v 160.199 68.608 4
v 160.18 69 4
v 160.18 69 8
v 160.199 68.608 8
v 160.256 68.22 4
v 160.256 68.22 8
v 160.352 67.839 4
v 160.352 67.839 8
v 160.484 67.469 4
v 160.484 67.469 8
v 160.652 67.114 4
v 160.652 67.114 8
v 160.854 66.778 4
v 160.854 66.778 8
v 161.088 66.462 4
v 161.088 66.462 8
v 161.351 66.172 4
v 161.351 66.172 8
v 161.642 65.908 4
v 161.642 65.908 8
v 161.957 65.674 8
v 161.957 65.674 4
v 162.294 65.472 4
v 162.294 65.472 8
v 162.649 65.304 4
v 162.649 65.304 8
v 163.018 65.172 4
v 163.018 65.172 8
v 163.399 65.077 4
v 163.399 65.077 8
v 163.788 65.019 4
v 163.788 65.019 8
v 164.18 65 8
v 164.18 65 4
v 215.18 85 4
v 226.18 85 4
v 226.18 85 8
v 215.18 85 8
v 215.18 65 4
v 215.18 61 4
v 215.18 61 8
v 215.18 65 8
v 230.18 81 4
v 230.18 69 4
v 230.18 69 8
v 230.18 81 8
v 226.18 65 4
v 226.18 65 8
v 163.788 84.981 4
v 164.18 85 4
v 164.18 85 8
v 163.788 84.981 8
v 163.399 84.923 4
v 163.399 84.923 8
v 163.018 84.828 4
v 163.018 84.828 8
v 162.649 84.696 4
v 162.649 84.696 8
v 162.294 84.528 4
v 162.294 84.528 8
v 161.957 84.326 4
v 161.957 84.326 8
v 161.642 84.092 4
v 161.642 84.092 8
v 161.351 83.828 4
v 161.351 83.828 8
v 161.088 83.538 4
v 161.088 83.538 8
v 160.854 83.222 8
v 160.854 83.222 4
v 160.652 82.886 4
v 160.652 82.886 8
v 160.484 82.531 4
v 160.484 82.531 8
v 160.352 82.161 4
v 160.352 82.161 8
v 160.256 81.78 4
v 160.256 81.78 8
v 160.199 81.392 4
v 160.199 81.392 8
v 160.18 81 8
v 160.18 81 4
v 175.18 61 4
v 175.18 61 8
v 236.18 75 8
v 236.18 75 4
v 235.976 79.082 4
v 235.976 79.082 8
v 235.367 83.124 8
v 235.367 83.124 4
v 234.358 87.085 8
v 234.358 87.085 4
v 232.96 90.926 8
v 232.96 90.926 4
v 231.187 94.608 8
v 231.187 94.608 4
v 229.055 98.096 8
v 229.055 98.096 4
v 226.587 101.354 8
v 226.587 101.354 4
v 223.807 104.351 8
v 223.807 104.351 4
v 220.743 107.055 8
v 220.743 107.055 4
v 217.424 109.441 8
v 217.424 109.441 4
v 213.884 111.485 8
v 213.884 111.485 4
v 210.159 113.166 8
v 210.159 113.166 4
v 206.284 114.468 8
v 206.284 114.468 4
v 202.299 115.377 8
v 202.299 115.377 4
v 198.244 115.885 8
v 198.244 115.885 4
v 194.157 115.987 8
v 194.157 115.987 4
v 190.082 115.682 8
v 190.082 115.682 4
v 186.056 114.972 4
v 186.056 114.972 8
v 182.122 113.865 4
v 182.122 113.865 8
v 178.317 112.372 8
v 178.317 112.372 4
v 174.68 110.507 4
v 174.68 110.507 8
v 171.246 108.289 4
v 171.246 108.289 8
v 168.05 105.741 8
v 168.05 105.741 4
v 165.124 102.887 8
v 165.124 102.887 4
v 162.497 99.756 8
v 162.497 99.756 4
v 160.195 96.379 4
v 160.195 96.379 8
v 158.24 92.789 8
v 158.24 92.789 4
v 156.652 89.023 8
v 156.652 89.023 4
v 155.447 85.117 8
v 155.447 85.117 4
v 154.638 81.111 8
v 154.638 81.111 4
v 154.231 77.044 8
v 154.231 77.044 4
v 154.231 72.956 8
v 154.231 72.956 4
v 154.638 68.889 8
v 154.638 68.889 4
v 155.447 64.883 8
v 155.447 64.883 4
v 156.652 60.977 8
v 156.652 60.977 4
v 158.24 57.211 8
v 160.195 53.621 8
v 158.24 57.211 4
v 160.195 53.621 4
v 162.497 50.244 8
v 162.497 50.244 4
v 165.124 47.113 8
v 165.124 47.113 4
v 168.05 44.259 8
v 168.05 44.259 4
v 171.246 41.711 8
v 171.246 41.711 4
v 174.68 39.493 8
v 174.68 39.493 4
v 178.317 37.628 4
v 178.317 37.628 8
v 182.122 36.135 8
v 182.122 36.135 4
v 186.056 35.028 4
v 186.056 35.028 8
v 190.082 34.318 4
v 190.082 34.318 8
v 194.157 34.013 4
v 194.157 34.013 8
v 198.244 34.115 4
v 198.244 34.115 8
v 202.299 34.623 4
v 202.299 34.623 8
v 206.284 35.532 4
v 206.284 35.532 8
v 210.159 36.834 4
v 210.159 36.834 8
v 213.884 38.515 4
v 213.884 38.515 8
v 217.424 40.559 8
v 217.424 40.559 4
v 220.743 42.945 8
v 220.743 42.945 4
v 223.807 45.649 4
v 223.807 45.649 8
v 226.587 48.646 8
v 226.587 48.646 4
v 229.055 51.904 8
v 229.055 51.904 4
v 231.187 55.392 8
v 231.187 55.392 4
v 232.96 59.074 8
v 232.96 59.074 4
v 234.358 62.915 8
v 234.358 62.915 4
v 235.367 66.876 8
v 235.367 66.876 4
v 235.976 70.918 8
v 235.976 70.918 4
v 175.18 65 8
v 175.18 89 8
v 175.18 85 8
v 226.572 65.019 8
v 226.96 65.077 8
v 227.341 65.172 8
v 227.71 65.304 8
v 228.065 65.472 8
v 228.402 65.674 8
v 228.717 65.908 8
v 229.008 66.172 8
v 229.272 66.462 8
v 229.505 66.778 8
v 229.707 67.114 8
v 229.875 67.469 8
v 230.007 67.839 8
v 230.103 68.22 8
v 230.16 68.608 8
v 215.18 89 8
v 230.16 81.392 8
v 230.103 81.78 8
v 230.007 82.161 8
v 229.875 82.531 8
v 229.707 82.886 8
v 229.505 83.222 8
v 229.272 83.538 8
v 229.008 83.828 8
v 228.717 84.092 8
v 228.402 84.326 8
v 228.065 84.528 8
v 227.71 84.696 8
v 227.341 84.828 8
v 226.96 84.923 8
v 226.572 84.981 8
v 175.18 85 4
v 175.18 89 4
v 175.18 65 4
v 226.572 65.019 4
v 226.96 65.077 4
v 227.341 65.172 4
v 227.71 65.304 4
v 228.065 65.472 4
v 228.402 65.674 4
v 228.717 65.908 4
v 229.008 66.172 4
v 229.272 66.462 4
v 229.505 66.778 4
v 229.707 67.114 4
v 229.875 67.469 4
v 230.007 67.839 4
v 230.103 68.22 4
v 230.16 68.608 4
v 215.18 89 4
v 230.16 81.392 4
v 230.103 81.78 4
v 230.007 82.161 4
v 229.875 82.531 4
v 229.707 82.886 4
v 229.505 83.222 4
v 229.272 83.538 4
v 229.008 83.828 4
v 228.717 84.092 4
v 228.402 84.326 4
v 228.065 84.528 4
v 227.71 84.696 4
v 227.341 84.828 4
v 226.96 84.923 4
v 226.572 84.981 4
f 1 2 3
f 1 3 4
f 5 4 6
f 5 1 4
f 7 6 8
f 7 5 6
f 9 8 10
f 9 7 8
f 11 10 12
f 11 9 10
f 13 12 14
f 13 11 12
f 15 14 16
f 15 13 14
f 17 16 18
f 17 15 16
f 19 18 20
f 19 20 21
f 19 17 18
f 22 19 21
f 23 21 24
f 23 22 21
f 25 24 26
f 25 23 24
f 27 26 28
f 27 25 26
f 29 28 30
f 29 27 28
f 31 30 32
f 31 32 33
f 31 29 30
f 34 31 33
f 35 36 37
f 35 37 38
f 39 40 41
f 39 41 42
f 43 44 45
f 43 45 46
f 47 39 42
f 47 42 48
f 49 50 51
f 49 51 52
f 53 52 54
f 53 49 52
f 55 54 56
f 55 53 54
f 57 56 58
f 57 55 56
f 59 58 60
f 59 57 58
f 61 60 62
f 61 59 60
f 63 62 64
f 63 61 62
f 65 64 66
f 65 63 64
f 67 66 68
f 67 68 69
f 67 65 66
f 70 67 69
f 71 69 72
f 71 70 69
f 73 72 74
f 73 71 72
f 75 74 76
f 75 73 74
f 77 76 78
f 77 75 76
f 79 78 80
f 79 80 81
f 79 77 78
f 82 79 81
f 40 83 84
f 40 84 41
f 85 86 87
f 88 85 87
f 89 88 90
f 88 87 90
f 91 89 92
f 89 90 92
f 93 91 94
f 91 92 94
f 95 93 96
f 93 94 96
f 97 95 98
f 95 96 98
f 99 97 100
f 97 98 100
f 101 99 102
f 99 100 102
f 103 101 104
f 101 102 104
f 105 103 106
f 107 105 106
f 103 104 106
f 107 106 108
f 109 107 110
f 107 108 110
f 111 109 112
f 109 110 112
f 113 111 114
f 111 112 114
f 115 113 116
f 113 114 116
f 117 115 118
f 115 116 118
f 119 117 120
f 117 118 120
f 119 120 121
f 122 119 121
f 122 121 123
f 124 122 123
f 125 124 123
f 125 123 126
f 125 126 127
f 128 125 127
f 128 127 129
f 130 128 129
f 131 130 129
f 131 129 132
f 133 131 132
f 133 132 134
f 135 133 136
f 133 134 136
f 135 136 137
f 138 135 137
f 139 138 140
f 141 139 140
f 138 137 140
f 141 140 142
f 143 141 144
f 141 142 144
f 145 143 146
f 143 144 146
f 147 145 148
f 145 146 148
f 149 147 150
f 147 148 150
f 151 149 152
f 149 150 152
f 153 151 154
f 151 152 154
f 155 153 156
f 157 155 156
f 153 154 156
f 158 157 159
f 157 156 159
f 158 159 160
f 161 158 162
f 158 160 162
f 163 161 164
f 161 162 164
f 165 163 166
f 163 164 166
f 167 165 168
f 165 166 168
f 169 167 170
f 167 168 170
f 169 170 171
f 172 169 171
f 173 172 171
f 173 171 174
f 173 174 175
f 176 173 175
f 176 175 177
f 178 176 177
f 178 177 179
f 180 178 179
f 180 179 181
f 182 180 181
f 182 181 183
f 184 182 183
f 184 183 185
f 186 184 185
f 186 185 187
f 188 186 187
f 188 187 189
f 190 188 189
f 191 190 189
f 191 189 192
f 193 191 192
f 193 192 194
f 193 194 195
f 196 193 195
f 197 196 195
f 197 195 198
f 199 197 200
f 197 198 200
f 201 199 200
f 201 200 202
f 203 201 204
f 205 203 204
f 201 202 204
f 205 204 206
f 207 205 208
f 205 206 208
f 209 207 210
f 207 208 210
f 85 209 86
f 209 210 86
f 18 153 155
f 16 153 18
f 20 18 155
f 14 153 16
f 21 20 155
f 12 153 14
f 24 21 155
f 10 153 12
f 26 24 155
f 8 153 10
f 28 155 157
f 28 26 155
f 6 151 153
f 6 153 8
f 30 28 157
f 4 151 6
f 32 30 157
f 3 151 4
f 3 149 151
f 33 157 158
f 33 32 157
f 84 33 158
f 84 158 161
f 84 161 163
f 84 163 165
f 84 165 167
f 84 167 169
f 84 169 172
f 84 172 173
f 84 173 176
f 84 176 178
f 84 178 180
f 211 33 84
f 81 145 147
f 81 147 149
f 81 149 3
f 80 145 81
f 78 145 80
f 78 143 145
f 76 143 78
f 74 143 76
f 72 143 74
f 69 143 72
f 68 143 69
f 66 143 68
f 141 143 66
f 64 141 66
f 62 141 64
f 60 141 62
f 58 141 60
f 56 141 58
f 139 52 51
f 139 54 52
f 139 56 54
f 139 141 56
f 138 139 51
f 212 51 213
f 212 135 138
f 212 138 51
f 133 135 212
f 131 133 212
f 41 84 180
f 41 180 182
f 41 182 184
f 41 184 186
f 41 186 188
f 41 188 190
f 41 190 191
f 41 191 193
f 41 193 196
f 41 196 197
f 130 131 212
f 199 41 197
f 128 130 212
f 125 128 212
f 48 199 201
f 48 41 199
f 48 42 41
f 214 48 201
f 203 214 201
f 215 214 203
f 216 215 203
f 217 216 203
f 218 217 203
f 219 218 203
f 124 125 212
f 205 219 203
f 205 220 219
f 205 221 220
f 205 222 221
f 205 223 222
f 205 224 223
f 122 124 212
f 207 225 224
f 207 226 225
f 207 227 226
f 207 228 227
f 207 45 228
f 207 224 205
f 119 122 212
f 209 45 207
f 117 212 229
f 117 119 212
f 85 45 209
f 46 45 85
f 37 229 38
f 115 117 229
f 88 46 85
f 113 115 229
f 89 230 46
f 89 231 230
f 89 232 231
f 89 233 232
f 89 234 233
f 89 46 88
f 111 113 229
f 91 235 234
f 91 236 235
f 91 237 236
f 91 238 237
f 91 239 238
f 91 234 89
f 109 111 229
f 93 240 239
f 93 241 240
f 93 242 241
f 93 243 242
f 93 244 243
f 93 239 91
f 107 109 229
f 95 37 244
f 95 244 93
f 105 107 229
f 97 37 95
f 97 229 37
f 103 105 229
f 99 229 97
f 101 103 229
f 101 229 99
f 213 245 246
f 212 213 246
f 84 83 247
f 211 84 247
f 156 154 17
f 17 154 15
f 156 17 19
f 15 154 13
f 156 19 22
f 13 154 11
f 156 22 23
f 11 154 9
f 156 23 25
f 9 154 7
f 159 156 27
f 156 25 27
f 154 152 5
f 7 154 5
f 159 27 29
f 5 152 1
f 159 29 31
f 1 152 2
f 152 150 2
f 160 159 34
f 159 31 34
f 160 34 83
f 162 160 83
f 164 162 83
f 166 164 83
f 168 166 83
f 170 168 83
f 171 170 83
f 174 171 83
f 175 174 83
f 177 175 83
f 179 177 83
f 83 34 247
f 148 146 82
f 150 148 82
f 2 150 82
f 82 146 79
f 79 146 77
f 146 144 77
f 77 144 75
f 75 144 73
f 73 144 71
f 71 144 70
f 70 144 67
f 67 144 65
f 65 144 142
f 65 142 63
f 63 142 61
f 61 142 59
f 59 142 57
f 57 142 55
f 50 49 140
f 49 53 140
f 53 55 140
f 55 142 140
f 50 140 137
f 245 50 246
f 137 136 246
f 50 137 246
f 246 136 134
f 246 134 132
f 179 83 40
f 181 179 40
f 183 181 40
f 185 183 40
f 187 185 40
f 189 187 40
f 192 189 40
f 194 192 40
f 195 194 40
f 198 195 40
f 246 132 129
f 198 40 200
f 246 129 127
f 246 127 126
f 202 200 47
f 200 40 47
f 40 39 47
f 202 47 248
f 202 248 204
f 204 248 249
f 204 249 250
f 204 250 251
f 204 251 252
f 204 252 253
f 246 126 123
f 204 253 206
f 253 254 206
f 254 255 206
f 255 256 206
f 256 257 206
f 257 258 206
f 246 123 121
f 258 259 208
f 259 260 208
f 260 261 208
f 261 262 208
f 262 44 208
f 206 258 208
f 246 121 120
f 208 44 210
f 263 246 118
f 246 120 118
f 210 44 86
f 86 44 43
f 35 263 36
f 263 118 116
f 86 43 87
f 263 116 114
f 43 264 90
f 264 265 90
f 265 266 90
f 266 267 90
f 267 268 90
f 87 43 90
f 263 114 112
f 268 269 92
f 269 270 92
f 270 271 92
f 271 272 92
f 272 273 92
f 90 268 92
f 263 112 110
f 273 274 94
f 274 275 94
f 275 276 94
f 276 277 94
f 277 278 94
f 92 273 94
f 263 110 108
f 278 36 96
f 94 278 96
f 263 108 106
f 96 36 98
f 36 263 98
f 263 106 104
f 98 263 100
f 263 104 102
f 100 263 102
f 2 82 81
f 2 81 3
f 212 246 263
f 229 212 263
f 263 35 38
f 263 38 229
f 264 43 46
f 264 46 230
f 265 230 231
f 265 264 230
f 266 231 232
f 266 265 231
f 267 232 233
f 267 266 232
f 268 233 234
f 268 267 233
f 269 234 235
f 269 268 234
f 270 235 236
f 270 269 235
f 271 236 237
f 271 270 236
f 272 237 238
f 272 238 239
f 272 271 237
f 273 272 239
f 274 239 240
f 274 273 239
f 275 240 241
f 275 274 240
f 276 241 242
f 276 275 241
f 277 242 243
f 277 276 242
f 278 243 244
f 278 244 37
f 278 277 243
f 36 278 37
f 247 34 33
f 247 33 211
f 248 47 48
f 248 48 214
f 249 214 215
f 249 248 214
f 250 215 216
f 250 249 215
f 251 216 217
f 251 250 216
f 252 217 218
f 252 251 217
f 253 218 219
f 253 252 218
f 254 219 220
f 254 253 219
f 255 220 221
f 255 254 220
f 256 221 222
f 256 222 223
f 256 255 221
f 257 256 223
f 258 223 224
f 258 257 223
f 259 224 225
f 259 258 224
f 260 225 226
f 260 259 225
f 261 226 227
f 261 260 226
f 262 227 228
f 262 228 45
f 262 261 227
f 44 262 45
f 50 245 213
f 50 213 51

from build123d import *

# Parameters (mm, degrees)
SKETCH_R        = 41
PAD_DEPTH       = 4
SKETCH004_W     = 40
SKETCH004_H     = 4
POCKET002_DEPTH = 8.001


with BuildPart() as part:
    # Sketch → Pad (new body)
    with BuildSketch(Plane.XY.offset(4)):
        with Locations((195.179598, 75)):
            Circle(SKETCH_R)
        with BuildLine():
            Line((195.179598, 65), (226.179598, 65))
            ThreePointArc((226.179598, 65), (229.008025, 66.171573), (230.179598, 69))
            Line((230.179598, 69), (230.179598, 81))
            ThreePointArc((230.179598, 81), (229.008025, 83.828427), (226.179598, 85))
            Line((226.179598, 85), (195.179598, 85))
            Line((195.179598, 85), (164.179598, 85))
            ThreePointArc((164.179598, 85), (161.351171, 83.828427), (160.179598, 81))
            Line((160.179598, 81), (160.179598, 69))
            ThreePointArc((160.179598, 69), (161.351171, 66.171573), (164.179598, 65))
            Line((164.179598, 65), (195.179598, 65))
        make_face(mode=Mode.SUBTRACT)
    extrude(amount=PAD_DEPTH)

    # Sketch004 → Pocket002 (cut, through all)
    with BuildSketch(Plane.XY):
        with Locations((195.179598, 63)):
            Rectangle(SKETCH004_W, SKETCH004_H)
        with Locations((195.179598, 87)):
            Rectangle(SKETCH004_W, SKETCH004_H)
    extrude(amount=POCKET002_DEPTH, mode=Mode.SUBTRACT)


solid = part.part
